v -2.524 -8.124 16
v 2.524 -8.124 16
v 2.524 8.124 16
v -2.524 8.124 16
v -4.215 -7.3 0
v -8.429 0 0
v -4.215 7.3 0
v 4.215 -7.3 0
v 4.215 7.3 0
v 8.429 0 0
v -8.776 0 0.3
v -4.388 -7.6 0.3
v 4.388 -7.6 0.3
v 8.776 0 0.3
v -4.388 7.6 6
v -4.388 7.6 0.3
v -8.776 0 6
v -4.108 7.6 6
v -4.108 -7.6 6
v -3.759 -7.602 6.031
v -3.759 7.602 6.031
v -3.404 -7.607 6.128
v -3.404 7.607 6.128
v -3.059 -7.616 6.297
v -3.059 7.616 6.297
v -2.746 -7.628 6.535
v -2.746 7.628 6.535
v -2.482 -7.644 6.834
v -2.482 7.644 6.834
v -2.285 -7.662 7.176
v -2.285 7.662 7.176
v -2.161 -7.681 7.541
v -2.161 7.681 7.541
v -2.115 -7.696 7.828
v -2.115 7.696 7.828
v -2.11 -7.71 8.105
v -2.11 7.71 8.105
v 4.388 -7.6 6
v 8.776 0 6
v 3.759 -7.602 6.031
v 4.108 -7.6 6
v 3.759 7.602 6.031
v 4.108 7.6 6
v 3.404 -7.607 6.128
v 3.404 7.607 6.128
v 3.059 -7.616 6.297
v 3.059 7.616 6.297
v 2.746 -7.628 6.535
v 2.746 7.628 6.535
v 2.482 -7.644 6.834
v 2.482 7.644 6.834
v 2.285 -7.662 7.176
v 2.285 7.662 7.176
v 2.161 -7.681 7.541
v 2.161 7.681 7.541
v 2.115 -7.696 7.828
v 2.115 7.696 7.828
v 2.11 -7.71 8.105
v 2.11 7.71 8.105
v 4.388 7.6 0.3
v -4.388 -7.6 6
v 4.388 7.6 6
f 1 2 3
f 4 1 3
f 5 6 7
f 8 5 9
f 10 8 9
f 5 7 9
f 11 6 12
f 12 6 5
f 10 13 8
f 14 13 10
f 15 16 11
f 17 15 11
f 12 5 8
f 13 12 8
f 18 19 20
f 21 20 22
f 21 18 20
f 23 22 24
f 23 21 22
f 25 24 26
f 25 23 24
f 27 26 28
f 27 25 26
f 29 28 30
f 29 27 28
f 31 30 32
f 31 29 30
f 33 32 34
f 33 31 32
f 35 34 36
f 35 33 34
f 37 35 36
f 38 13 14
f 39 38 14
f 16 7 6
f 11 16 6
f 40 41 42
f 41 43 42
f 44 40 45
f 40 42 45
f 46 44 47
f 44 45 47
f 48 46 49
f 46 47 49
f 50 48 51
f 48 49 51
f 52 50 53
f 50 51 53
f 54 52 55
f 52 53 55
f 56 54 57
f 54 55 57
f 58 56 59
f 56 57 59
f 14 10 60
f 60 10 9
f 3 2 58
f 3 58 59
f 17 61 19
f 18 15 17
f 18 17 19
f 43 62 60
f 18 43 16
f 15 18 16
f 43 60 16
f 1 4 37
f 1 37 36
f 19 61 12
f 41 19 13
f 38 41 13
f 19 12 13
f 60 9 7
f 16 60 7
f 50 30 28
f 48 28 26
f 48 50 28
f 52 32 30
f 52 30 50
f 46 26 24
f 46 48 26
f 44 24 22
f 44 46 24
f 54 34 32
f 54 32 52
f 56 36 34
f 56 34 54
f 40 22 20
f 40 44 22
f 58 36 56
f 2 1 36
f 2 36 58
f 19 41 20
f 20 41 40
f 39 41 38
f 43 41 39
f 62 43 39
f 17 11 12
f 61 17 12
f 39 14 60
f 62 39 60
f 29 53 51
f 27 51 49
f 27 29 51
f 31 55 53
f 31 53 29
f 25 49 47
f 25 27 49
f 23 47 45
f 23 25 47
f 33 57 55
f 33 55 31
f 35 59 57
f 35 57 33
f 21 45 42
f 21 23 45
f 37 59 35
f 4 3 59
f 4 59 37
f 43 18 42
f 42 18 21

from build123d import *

# Parameters (mm, degrees)
F1_DEPTH = 6
F2_W     = 4
F2_H     = 15.2
F3_DEPTH = 10
F3_TAPER = -3
F4_R     = 2
F5_SIZE  = 0.3


with BuildPart() as f1:
    # F0 (on Top) → F1 (new body)
    with BuildSketch(Plane.XY):
        Polygon((4.3878620458, -7.6), (8.7757240917, 0), (4.3878620458, 7.6), (-4.3878620458, 7.6), (-8.7757240917, 0), (-4.3878620458, -7.6), align=None)
    extrude(amount=F1_DEPTH)

    # F2 (on face) → F3 (join)
    with BuildSketch(Plane.XY.offset(6)):
        Rectangle(F2_W, F2_H)
    extrude(amount=F3_DEPTH, taper=F3_TAPER)

    # F4
    f4_edges = [f1.edges().sort_by_distance(p)[0] for p in [
        (2, 0, 6),
        (-2, 0, 6),
    ]]
    fillet(f4_edges, radius=F4_R)

    # F5
    f5_edges = [f1.edges().sort_by_distance(p)[0] for p in [
        (-6.581793, -3.8, 0),
        (0, -7.6, 0),
        (6.581793, -3.8, 0),
        (6.581793, 3.8, 0),
        (0, 7.6, 0),
        (-6.581793, 3.8, 0),
    ]]
    chamfer(f5_edges, length=F5_SIZE)


solid = f1.part
